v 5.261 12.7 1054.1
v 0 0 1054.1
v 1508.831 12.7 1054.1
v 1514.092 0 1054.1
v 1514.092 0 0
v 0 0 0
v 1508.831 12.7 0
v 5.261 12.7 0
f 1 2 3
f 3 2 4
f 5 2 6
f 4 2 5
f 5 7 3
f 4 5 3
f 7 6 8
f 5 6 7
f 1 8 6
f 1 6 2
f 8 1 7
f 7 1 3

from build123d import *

# Parameters (mm, degrees)
F0_W       = 1514.0918044843
F0_H       = 1054.1
F1_DEPTH   = 12.7
F2_SIZE2   = 5.260502
F2_SIZE    = 12.69999
F2_2_SIZE2 = 5.260502
F2_2_SIZE  = 12.69999


# Not quite as in the source:
# - a fillet or chamfer is up to 0.001 mm smaller than in the source, because OpenCascade refuses the exact size


with BuildPart() as f1:
    # F0 (on Front) → F1 (new body)
    with BuildSketch(Plane.XZ):
        with Locations((757.0459022421, 527.05)):
            Rectangle(F0_W, F0_H)
    extrude(amount=-F1_DEPTH)

    # F2 (size 12.7 and 5.2605122421 in the source; OpenCascade refuses exactly that, so slightly less here)
    f2_edges = [f1.edges().sort_by_distance(p)[0] for p in [
        (1514.091804, 12.7, 527.05),
    ]]
    f2_side = f1.faces().sort_by_distance((1514.091804, 6.35, 527.05))[0]
    chamfer(f2_edges, length=F2_SIZE, length2=F2_SIZE2, reference=f2_side)

    # F2#2 (size 12.7 and 5.2605122421 in the source; OpenCascade refuses exactly that, so slightly less here)
    f2_2_edges = [f1.edges().sort_by_distance(p)[0] for p in [
        (0, 12.7, 527.05),
    ]]
    f2_2_side = f1.faces().sort_by_distance((0, 6.35, 527.05))[0]
    chamfer(f2_2_edges, length=F2_2_SIZE, length2=F2_2_SIZE2, reference=f2_2_side)


solid = f1.part
